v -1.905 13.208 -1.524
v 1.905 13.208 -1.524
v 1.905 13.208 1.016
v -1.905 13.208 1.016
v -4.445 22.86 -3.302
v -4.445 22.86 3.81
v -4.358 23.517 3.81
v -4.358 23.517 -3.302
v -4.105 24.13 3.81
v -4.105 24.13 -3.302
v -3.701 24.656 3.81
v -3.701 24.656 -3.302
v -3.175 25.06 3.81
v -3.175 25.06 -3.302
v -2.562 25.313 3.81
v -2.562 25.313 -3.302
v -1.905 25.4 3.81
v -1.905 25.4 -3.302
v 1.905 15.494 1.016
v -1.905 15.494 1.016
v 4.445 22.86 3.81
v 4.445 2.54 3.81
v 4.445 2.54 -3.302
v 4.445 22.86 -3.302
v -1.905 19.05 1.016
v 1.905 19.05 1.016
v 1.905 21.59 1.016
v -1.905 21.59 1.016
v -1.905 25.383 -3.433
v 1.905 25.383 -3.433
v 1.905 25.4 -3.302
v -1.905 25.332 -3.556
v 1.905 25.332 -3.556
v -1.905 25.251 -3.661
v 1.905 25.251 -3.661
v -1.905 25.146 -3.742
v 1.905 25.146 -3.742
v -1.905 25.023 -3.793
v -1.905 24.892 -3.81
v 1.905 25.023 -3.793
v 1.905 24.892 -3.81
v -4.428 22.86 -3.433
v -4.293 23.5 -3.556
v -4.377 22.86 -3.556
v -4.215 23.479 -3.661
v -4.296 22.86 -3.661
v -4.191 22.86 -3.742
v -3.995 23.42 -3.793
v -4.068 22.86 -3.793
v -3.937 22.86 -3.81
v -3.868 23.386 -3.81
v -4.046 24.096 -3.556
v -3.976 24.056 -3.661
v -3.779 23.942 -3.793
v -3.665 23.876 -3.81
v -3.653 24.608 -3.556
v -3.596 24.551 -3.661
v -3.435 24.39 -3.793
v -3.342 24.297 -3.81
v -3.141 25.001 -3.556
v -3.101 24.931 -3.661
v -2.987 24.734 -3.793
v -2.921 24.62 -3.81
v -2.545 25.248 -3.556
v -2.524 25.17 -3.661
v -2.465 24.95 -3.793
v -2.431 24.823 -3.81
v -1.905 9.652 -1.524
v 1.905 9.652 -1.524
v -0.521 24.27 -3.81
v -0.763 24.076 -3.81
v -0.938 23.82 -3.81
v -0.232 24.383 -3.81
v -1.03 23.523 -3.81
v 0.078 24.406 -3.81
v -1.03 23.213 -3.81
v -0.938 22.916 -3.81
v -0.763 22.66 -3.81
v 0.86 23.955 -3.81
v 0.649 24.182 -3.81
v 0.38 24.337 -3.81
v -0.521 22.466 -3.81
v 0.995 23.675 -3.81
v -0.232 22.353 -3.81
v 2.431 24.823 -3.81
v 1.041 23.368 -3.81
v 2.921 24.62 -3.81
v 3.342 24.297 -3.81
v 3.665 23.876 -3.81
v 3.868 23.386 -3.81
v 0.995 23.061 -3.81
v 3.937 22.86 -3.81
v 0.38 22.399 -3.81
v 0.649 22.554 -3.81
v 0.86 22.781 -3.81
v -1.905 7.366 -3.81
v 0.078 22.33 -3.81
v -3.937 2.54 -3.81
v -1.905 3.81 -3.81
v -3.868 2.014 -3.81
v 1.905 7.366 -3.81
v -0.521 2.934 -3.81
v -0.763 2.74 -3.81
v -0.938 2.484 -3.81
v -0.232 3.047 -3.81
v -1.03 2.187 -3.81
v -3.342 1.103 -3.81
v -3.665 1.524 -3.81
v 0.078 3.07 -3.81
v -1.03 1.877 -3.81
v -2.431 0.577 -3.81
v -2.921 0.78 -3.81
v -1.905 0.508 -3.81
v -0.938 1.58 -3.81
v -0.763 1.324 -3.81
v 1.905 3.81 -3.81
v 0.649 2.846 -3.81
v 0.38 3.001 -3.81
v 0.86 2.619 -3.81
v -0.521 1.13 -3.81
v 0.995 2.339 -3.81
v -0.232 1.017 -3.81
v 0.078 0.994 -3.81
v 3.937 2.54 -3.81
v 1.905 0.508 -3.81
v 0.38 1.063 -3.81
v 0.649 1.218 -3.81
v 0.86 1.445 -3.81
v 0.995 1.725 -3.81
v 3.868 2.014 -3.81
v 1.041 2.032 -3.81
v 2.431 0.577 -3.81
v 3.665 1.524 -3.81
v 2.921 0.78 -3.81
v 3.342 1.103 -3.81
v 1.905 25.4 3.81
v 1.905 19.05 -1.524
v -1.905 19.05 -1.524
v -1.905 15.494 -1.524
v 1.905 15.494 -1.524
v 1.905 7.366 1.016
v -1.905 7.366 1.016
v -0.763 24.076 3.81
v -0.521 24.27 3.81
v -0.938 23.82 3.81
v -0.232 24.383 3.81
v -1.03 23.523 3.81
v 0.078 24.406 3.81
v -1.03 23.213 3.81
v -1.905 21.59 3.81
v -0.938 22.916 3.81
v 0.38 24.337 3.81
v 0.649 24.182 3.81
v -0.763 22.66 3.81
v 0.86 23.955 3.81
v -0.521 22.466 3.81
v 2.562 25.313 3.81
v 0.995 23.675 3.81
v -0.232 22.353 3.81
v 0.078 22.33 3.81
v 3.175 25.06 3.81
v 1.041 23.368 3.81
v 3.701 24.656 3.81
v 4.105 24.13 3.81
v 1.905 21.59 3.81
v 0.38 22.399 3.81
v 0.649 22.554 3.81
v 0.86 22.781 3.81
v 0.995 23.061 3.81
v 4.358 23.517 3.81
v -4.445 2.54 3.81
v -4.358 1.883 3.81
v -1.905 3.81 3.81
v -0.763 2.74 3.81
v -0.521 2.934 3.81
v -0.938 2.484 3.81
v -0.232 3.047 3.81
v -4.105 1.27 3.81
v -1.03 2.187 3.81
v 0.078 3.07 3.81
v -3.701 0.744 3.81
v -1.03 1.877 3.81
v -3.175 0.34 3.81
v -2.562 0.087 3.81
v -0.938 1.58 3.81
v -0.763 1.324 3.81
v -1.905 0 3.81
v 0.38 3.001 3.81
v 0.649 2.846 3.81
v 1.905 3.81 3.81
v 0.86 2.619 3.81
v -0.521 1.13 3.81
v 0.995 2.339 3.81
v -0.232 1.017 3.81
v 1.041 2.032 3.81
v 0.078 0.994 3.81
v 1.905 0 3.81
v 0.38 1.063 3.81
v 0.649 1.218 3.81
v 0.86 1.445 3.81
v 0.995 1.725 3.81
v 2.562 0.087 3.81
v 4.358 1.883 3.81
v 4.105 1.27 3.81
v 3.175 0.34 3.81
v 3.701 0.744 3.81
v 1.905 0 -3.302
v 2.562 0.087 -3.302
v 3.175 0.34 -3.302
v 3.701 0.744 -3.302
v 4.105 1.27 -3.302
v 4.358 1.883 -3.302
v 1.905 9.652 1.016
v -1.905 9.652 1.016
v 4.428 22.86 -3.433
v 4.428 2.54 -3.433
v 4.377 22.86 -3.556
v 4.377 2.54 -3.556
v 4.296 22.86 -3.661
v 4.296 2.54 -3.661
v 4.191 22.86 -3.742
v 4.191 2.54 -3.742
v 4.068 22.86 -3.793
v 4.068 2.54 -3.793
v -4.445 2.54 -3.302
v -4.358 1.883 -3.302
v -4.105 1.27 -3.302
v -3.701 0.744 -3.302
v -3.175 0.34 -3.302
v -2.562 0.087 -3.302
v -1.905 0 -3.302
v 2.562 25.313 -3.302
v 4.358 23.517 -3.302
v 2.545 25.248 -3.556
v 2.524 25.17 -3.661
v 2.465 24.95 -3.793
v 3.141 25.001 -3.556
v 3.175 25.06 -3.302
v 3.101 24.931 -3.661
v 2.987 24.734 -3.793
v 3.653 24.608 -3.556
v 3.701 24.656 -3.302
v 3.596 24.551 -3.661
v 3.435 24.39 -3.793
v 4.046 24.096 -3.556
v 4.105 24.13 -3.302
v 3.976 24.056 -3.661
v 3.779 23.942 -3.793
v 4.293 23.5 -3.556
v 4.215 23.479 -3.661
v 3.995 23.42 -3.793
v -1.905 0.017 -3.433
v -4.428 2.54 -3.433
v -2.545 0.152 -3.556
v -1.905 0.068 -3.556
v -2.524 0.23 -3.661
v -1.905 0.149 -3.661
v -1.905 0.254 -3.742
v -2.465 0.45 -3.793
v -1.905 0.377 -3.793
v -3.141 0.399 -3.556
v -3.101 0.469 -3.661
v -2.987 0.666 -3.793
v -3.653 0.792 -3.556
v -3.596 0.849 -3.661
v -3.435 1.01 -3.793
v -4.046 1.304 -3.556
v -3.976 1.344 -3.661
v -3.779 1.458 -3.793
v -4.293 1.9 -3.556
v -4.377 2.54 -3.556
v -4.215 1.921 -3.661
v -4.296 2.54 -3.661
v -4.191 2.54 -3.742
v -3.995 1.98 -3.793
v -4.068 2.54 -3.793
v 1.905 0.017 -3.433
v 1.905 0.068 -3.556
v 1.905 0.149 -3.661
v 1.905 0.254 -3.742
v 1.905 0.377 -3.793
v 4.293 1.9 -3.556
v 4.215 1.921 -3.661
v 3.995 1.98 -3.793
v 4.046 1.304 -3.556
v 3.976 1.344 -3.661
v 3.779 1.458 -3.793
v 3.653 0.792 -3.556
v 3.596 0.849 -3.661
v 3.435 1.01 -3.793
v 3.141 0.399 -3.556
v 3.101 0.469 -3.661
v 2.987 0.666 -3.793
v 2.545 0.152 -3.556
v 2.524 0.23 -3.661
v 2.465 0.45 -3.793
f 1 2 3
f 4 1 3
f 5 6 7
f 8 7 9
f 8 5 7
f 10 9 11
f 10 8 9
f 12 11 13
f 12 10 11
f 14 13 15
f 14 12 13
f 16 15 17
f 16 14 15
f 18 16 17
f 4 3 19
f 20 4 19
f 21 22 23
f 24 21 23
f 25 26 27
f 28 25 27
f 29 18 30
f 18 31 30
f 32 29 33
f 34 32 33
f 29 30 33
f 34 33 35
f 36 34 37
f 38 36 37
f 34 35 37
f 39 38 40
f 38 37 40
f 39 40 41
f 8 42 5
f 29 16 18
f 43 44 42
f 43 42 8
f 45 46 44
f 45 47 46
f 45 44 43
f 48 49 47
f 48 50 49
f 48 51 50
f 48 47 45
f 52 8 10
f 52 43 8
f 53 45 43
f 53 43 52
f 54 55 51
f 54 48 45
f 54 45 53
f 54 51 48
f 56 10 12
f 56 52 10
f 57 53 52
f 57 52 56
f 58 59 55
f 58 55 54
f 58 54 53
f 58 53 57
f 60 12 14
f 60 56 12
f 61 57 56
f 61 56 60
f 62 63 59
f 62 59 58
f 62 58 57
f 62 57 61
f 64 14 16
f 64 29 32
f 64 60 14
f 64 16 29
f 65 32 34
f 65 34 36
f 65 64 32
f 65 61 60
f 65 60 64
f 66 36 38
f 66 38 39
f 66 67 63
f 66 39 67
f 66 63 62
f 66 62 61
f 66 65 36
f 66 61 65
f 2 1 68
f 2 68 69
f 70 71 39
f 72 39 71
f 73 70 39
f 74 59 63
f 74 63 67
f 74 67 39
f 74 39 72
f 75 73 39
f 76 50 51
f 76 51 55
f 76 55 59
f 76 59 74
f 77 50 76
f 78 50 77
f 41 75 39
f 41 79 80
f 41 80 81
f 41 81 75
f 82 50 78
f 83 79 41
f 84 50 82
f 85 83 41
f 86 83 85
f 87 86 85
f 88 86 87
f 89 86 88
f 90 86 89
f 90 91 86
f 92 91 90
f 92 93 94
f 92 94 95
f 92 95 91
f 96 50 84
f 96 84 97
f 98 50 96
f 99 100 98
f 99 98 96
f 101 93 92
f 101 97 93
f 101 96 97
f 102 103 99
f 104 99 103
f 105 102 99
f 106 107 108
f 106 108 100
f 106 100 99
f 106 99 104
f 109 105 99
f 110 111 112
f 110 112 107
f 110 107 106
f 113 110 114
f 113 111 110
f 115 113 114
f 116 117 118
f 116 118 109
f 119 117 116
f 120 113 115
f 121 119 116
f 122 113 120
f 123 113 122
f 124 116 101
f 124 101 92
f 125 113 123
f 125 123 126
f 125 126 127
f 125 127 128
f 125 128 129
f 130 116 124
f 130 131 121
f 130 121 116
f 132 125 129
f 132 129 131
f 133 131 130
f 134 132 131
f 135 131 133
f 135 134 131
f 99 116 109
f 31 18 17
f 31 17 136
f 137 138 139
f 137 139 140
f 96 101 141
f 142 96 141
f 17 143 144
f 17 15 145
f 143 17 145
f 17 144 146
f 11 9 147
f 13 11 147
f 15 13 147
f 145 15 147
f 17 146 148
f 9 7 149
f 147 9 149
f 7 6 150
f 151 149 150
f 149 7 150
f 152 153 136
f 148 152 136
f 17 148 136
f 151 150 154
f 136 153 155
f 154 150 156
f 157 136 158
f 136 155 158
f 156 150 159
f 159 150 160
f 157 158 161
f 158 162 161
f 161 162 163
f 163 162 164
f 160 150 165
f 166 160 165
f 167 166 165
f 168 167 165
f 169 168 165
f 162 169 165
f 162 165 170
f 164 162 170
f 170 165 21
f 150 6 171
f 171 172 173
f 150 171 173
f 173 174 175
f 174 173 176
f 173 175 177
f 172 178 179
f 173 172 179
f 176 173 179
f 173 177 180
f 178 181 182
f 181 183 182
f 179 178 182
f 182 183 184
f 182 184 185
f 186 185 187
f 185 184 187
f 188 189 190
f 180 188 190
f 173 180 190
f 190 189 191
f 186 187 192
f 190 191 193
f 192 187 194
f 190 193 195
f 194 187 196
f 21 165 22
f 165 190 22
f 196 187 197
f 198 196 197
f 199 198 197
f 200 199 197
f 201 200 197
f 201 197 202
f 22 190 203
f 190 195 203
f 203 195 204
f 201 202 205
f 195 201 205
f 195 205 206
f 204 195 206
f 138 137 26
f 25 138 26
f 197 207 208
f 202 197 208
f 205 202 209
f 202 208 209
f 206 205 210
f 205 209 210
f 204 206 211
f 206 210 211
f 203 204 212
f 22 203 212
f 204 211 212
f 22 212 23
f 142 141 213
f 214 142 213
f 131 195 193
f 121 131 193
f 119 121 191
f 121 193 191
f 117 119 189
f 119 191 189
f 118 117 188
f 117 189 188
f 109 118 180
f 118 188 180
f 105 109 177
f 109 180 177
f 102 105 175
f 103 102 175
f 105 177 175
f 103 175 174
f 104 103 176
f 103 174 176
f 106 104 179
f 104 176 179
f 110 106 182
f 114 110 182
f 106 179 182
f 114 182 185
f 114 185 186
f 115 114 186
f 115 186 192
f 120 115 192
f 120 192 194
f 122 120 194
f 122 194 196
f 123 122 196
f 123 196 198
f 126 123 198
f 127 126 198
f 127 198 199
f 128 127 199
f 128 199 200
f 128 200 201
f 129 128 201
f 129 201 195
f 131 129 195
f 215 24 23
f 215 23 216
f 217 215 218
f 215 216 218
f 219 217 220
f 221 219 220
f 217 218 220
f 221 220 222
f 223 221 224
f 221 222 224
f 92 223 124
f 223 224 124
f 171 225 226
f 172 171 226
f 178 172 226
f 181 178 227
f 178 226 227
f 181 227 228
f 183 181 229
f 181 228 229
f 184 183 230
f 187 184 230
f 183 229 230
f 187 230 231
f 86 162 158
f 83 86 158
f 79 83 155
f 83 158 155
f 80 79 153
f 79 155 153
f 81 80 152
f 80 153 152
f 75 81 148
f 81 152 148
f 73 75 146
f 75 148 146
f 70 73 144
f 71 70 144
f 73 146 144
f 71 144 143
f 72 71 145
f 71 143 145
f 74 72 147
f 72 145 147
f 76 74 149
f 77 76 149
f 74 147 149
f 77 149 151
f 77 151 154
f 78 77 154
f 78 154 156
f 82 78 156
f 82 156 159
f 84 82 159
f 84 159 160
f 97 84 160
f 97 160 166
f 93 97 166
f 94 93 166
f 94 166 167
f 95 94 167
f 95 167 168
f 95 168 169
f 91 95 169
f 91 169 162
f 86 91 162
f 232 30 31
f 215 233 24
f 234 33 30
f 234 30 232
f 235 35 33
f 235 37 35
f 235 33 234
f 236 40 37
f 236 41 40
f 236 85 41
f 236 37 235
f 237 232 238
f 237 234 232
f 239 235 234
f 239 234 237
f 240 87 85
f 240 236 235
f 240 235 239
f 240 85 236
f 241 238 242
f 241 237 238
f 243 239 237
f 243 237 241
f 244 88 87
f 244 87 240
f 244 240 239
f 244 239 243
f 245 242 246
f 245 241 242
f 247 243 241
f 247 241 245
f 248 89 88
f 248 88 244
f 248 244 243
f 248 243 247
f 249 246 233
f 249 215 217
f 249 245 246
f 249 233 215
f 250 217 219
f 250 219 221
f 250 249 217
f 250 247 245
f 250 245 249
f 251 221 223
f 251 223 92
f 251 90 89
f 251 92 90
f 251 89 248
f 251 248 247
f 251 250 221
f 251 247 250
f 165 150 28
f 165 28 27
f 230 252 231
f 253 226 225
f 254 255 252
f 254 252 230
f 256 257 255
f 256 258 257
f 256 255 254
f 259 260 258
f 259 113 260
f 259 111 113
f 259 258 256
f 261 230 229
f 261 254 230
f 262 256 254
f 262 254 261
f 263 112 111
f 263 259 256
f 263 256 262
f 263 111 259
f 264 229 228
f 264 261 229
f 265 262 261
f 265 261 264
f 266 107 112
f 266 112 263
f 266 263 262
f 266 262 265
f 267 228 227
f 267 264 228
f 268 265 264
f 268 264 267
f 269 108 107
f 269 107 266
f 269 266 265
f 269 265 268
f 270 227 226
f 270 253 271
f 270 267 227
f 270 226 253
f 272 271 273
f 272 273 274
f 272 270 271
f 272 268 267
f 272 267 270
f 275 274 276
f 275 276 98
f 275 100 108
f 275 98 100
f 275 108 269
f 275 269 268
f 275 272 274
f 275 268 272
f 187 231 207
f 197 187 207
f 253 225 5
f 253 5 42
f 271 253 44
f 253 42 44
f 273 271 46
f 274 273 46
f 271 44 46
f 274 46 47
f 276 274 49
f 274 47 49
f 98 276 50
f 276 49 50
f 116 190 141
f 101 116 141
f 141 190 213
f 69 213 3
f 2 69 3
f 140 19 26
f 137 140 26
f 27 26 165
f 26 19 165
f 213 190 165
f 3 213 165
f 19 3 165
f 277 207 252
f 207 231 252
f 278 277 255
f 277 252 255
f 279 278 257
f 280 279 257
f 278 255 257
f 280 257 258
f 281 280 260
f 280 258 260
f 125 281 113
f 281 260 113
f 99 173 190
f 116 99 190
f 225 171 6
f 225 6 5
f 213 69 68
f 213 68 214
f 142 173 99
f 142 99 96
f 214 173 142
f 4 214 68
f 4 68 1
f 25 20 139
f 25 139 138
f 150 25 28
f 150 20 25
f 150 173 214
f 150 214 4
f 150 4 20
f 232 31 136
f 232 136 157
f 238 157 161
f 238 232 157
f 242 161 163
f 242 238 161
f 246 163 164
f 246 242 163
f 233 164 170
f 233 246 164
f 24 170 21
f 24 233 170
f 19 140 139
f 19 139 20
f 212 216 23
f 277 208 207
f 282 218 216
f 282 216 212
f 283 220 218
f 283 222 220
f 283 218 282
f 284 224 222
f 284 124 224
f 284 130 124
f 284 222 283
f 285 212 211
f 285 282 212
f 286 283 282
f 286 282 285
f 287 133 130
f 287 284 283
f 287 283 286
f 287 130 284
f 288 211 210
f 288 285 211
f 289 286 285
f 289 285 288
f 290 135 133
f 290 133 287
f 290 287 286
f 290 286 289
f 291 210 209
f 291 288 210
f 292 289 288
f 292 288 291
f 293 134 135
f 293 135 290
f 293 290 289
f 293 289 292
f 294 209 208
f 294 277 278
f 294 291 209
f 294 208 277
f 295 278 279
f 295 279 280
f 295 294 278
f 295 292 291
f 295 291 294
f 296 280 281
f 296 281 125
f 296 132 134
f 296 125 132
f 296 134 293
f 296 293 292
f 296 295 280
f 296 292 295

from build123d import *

# Parameters (mm, degrees)
SKETCH1_W           = 8.89
SKETCH1_H           = 7.62
BOSS_EXTRUDE1_DEPTH = 25.4
SKETCH2_W           = 3.81
SKETCH2_H           = 17.78
CUT_EXTRUDE1_DEPTH  = 5.334
SKETCH3_W           = 2.54
SKETCH3_H           = 2.286
SKETCH3_H_2         = 2.54
BOSS_EXTRUDE2_DEPTH = 3.81
SKETCH4_W           = 3.81
SKETCH4_H           = 3.556
CUT_EXTRUDE2_DEPTH  = 3.286
SKETCH5_R           = 1.0414
CUT_EXTRUDE4_DEPTH  = 8.62
FILLET3_R           = 2.54
FILLET2_R           = 0.508


with BuildPart() as part:
    # Sketch1 → Boss-Extrude1 (new body)
    with BuildSketch(Plane(origin=(0, 0, 0), x_dir=(1, 0, 0), z_dir=(0, 1, 0))):
        Rectangle(SKETCH1_W, SKETCH1_H)
    extrude(amount=BOSS_EXTRUDE1_DEPTH)

    # Sketch2 → Cut-Extrude1 (cut)
    with BuildSketch(Plane.XY.offset(3.81)):
        with Locations((0, 12.7)):
            Rectangle(SKETCH2_W, SKETCH2_H)
    extrude(amount=-CUT_EXTRUDE1_DEPTH, mode=Mode.SUBTRACT)

    # Sketch3 → Boss-Extrude2 (add)
    with BuildSketch(Plane.ZY.offset(-1.905)):
        with Locations((-0.254, 14.351)):
            Rectangle(SKETCH3_W, SKETCH3_H)
        with Locations((-0.254, 8.509)):
            Rectangle(SKETCH3_W, SKETCH3_H)
        with Locations((-0.254, 20.32)):
            Rectangle(SKETCH3_W, SKETCH3_H_2)
    extrude(amount=BOSS_EXTRUDE2_DEPTH)

    # Sketch4 → Cut-Extrude2 (cut, through all)
    with BuildSketch(Plane.XY.offset(-1.524)):
        with Locations((0, 5.588)):
            Rectangle(SKETCH4_W, SKETCH4_H)
    extrude(amount=-CUT_EXTRUDE2_DEPTH, mode=Mode.SUBTRACT)

    # Sketch5 → Cut-Extrude4 (cut, through all)
    with BuildSketch(Plane.XY.offset(3.81)):
        with Locations((0, 2.032)):
            Circle(SKETCH5_R)
        with Locations((0, 23.368)):
            Circle(SKETCH5_R)
    extrude(amount=-CUT_EXTRUDE4_DEPTH, mode=Mode.SUBTRACT)

    # Fillet3
    fillet3_edges = [part.edges().sort_by_distance(p)[0] for p in [
        (-4.445, 25.4, 0),
        (4.445, 25.4, 0),
        (-4.445, 0, 0),
        (4.445, 0, 0),
    ]]
    fillet(fillet3_edges, radius=FILLET3_R)

    # Fillet2
    fillet2_edges = [part.edges().sort_by_distance(p)[0] for p in [
        (0, 25.4, -3.81),
        (4.445, 12.7, -3.81),
        (-3.701051224, 24.656051224, -3.81),
        (3.701051224, 24.656051224, -3.81),
        (3.701051224, 0.743948776, -3.81),
        (-3.701051224, 0.743948776, -3.81),
        (-4.445, 12.7, -3.81),
        (0, 0, -3.81),
    ]]
    fillet(fillet2_edges, radius=FILLET2_R)


solid = part.part
